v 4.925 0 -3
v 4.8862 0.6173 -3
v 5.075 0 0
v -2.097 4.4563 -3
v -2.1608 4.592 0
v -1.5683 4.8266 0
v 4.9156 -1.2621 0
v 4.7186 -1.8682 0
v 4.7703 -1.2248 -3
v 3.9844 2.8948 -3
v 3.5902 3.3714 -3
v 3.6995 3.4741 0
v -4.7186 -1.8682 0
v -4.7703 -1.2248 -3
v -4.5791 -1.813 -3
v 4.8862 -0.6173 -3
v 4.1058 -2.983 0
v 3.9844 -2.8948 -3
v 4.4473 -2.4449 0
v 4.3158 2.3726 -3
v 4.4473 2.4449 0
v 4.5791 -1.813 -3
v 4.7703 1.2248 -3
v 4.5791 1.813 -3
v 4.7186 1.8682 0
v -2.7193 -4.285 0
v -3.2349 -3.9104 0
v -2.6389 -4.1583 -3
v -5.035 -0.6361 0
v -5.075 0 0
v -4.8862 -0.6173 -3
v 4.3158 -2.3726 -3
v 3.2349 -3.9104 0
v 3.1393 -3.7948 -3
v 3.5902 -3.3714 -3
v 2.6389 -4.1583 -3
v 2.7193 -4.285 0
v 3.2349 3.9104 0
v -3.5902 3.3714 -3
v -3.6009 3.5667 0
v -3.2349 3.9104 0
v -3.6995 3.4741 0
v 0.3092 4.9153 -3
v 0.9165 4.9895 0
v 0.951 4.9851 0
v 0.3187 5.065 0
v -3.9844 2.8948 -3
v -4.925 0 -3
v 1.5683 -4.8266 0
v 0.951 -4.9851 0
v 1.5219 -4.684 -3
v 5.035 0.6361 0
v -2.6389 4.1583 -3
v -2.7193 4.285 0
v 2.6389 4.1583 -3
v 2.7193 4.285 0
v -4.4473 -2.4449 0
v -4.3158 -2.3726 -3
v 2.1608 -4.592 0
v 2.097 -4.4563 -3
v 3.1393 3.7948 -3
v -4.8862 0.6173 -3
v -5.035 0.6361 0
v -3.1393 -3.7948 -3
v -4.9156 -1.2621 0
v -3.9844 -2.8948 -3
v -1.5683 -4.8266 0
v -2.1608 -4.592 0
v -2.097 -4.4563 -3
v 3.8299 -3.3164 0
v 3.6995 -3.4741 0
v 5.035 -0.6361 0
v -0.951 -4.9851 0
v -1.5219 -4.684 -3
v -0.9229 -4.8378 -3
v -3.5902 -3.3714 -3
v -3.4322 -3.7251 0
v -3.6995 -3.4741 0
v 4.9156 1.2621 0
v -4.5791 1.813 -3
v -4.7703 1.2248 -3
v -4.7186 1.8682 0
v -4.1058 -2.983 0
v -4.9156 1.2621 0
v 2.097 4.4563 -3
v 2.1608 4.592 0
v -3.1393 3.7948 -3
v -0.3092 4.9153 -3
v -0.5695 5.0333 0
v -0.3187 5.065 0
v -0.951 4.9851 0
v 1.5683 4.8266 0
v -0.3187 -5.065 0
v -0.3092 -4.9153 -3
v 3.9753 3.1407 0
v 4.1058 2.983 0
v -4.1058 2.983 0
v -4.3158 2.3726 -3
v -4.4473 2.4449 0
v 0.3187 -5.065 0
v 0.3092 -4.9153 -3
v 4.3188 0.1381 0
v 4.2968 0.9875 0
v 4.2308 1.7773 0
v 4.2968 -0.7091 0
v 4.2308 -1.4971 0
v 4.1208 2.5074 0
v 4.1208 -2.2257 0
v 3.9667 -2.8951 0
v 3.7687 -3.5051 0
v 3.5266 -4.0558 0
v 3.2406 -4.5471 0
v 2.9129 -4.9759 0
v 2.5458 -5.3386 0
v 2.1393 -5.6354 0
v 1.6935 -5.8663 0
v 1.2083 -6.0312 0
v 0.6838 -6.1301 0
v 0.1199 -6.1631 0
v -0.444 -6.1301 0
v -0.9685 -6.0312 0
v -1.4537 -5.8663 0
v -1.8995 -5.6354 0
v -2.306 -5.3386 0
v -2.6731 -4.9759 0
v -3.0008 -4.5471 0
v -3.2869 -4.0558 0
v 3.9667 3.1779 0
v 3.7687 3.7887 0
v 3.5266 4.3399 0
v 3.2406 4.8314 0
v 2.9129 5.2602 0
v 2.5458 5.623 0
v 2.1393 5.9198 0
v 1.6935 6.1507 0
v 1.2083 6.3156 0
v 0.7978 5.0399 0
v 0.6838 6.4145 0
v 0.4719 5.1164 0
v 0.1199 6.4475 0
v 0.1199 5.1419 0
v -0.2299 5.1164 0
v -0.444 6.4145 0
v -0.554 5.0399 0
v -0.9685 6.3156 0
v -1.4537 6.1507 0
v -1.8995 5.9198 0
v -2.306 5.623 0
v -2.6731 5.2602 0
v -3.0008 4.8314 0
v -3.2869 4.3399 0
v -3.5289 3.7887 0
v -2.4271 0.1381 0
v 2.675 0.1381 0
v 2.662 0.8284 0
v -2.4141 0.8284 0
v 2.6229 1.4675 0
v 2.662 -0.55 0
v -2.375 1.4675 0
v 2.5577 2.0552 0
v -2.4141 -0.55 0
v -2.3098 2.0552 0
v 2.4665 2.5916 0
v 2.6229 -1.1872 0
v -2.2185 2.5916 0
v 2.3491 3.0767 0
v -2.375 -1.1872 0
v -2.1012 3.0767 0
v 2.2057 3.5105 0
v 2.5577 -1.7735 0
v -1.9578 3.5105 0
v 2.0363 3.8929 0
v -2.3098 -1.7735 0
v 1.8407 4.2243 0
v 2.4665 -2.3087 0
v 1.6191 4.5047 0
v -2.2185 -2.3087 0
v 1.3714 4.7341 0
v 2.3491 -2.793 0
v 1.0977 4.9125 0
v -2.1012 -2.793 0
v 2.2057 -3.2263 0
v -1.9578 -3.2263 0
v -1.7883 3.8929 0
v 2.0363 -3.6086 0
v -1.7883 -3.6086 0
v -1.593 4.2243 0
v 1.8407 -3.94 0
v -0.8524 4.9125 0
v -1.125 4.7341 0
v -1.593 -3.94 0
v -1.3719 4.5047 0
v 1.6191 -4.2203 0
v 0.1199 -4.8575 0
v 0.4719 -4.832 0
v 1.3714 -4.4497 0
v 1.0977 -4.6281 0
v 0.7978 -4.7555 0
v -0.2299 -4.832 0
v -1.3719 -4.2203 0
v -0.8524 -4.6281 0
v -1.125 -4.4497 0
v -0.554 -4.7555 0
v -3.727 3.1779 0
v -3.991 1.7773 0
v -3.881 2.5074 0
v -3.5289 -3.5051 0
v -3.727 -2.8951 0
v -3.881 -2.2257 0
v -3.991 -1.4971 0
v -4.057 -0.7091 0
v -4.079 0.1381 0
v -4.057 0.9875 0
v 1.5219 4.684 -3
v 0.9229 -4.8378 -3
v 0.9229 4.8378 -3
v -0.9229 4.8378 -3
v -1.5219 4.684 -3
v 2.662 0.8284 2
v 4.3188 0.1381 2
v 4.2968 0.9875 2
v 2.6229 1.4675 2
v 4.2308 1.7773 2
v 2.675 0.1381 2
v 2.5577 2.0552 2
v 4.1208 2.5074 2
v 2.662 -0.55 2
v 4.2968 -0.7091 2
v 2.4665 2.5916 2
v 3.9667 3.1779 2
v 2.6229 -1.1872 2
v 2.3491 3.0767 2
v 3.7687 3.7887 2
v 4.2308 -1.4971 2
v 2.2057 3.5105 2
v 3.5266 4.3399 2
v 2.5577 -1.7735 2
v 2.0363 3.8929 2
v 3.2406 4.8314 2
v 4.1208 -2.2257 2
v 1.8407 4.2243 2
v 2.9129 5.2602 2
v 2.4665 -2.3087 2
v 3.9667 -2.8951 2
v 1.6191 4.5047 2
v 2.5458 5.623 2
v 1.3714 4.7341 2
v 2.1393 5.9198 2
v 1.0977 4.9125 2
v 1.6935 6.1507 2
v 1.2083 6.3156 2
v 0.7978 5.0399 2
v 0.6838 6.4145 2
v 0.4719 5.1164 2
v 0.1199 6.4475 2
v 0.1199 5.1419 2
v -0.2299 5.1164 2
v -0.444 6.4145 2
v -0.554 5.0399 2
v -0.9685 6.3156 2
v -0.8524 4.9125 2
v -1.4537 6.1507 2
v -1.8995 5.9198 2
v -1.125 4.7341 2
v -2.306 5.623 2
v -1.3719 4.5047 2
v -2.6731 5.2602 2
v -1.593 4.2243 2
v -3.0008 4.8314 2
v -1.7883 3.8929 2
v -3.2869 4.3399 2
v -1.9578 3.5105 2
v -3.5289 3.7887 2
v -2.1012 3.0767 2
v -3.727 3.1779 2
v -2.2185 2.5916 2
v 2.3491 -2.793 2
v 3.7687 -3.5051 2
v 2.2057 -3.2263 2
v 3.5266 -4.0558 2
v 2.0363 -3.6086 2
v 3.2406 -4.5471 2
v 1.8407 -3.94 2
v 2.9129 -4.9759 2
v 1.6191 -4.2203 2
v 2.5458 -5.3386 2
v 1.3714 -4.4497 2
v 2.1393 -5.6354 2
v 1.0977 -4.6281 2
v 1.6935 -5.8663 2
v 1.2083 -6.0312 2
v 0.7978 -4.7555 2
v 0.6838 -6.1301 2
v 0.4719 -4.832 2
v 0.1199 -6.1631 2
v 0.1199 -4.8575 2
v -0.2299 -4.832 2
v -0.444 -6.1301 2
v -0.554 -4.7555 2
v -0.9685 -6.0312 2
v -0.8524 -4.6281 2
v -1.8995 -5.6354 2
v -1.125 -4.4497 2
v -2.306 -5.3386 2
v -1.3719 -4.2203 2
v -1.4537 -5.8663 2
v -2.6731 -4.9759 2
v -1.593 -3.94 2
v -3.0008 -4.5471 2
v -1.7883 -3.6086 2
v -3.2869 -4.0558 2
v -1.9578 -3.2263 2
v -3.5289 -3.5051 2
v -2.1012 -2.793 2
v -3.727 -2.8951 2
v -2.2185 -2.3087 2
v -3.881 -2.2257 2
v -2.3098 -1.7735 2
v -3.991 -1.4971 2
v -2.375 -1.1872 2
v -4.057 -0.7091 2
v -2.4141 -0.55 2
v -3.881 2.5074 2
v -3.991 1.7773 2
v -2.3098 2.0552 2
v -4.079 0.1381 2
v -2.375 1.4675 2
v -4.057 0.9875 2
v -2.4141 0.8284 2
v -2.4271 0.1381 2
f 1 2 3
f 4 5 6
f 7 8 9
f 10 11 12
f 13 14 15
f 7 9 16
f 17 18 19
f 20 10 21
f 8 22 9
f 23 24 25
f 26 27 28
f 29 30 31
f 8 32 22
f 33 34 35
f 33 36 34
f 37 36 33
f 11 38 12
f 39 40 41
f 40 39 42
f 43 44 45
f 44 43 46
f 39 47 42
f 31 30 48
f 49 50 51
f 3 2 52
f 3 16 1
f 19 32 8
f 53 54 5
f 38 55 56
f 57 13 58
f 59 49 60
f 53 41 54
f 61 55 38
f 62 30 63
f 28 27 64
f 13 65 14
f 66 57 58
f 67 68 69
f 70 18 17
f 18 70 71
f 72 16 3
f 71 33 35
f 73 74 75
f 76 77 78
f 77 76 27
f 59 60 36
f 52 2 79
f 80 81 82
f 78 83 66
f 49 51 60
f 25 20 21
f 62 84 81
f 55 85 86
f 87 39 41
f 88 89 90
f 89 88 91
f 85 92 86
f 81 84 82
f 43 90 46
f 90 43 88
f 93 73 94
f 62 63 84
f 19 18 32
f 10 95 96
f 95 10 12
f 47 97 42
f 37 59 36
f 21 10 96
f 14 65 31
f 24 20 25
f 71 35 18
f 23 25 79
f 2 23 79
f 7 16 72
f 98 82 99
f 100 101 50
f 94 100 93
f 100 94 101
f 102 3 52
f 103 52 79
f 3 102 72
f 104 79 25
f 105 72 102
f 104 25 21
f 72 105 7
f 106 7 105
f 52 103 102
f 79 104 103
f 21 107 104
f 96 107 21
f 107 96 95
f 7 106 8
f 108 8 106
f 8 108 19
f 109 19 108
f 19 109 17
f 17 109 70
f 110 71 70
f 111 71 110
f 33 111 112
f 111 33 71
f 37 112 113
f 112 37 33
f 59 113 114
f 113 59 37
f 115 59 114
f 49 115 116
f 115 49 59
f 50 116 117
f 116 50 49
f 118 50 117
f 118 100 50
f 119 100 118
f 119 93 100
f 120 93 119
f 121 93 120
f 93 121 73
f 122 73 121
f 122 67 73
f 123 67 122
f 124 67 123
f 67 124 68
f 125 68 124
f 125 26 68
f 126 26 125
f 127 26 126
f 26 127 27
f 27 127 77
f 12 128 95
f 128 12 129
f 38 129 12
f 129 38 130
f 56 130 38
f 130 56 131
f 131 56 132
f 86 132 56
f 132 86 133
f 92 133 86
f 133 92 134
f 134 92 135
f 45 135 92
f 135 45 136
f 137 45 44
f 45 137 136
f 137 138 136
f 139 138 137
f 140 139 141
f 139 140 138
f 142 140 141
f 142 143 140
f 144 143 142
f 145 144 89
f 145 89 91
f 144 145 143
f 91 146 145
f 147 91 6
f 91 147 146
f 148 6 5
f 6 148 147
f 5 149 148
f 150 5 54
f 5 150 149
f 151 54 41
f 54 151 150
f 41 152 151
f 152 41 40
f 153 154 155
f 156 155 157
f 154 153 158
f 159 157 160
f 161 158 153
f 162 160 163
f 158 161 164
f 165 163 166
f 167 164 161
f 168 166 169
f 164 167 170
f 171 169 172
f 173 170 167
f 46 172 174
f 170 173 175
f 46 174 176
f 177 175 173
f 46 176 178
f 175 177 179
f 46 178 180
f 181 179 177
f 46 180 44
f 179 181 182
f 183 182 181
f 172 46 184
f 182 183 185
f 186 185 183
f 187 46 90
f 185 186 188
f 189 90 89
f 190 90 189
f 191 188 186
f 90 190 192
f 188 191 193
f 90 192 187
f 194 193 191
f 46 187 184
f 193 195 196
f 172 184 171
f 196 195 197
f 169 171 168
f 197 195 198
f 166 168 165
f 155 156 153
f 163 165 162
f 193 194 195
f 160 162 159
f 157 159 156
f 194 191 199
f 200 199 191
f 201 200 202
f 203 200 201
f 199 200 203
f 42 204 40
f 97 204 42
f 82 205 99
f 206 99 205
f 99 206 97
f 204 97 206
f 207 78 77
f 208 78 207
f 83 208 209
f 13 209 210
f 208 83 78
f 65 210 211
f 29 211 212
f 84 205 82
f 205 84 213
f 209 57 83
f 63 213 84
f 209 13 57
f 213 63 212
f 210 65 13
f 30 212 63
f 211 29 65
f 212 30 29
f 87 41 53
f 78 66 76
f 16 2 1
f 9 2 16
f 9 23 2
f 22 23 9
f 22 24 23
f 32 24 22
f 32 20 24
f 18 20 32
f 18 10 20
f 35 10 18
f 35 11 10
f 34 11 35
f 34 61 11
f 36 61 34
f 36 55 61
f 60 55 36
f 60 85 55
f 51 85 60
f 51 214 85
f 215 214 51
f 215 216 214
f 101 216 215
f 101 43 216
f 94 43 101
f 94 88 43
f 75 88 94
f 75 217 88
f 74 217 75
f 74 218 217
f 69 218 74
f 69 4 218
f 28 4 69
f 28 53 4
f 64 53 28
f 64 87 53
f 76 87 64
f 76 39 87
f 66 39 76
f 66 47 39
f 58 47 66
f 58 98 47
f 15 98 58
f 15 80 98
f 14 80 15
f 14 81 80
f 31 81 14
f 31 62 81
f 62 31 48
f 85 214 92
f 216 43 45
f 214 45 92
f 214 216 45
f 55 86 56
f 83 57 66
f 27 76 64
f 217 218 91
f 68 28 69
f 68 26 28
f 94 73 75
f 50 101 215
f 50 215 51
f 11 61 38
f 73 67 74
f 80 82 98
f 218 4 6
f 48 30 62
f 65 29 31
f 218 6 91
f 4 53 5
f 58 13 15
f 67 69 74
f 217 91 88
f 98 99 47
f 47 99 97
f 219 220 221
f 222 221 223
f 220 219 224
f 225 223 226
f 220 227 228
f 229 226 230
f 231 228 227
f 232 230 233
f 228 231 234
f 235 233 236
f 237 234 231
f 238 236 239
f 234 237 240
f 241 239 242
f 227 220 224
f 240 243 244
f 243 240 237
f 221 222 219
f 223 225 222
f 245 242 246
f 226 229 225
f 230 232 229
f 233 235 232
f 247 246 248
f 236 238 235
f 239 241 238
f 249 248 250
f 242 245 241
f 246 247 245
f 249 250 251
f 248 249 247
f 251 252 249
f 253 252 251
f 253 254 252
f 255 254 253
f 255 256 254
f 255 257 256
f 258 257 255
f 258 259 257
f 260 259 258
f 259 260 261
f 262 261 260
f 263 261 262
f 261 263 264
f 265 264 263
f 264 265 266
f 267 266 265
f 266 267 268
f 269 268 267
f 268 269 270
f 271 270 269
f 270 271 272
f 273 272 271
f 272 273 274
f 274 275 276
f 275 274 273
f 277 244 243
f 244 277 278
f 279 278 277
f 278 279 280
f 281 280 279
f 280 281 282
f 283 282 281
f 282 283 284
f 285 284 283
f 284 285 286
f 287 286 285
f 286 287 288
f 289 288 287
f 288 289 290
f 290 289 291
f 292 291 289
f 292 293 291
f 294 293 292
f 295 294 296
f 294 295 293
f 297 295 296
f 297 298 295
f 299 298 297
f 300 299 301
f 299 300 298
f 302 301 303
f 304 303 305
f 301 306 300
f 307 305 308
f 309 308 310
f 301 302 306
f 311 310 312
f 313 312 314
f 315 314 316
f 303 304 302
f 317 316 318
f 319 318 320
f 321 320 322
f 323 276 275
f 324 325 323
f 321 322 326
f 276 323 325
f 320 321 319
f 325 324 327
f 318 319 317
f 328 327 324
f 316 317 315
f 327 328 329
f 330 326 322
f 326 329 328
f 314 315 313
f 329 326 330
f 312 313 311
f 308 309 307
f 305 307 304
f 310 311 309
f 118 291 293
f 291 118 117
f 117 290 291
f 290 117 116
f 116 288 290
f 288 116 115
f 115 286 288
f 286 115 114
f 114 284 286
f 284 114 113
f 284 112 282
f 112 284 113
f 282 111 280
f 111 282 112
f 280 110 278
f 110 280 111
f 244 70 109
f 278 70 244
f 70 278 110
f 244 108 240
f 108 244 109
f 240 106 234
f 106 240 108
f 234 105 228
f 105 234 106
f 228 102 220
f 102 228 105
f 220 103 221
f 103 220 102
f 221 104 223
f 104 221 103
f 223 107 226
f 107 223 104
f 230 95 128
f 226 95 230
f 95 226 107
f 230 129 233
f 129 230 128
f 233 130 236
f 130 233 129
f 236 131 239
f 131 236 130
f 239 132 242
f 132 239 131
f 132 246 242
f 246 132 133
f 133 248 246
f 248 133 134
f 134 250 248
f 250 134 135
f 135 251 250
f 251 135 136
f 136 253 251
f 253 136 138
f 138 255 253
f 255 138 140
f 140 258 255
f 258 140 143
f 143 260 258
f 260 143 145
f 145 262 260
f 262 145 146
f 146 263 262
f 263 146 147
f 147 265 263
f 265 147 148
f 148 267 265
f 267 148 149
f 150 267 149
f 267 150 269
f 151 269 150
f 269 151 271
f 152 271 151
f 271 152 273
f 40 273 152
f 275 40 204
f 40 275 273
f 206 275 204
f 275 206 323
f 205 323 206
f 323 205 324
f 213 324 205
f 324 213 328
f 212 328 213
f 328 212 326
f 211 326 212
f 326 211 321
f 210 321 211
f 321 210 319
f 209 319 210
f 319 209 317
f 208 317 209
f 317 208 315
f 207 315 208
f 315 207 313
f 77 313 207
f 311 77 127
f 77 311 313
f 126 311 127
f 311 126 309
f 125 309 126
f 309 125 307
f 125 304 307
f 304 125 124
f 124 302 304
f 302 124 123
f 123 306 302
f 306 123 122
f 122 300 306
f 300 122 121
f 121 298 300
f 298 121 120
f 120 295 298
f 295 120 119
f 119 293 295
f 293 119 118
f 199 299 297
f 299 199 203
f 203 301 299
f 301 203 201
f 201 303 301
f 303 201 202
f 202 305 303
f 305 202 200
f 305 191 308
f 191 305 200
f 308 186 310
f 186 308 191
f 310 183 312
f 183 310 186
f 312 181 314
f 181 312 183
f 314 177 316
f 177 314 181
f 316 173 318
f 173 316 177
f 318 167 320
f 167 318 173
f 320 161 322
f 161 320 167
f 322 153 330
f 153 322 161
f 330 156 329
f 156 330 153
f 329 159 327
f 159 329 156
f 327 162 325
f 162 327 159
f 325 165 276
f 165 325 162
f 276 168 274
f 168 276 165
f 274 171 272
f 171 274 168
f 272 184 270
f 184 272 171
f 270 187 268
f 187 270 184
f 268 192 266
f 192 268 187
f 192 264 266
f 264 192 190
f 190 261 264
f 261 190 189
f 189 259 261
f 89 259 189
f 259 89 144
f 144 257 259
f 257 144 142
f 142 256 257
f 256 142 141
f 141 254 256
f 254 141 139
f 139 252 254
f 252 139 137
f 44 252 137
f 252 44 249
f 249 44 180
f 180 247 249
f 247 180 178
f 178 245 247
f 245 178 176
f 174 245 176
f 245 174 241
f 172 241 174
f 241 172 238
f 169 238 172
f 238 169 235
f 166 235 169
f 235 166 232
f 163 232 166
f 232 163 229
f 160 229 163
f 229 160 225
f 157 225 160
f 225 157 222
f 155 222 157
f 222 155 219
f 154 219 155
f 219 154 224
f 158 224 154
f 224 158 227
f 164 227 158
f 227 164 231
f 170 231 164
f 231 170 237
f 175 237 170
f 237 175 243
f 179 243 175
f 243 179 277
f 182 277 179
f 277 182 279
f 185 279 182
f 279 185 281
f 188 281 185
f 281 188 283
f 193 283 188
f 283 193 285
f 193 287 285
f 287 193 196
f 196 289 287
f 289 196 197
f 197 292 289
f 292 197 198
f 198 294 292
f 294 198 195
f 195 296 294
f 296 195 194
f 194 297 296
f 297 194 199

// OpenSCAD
$fn = 50;

difference() {
	union() {
		translate(v = [0, 0, -3.0]) {
			cylinder(h = 3, r1 = 4.925, r2 = 5.075);
		}
		linear_extrude(height = 2) {
			text(font = "Impact", halign = "center", size = 12, text = "0", valign = "center");
		}
	}
	union();
}
